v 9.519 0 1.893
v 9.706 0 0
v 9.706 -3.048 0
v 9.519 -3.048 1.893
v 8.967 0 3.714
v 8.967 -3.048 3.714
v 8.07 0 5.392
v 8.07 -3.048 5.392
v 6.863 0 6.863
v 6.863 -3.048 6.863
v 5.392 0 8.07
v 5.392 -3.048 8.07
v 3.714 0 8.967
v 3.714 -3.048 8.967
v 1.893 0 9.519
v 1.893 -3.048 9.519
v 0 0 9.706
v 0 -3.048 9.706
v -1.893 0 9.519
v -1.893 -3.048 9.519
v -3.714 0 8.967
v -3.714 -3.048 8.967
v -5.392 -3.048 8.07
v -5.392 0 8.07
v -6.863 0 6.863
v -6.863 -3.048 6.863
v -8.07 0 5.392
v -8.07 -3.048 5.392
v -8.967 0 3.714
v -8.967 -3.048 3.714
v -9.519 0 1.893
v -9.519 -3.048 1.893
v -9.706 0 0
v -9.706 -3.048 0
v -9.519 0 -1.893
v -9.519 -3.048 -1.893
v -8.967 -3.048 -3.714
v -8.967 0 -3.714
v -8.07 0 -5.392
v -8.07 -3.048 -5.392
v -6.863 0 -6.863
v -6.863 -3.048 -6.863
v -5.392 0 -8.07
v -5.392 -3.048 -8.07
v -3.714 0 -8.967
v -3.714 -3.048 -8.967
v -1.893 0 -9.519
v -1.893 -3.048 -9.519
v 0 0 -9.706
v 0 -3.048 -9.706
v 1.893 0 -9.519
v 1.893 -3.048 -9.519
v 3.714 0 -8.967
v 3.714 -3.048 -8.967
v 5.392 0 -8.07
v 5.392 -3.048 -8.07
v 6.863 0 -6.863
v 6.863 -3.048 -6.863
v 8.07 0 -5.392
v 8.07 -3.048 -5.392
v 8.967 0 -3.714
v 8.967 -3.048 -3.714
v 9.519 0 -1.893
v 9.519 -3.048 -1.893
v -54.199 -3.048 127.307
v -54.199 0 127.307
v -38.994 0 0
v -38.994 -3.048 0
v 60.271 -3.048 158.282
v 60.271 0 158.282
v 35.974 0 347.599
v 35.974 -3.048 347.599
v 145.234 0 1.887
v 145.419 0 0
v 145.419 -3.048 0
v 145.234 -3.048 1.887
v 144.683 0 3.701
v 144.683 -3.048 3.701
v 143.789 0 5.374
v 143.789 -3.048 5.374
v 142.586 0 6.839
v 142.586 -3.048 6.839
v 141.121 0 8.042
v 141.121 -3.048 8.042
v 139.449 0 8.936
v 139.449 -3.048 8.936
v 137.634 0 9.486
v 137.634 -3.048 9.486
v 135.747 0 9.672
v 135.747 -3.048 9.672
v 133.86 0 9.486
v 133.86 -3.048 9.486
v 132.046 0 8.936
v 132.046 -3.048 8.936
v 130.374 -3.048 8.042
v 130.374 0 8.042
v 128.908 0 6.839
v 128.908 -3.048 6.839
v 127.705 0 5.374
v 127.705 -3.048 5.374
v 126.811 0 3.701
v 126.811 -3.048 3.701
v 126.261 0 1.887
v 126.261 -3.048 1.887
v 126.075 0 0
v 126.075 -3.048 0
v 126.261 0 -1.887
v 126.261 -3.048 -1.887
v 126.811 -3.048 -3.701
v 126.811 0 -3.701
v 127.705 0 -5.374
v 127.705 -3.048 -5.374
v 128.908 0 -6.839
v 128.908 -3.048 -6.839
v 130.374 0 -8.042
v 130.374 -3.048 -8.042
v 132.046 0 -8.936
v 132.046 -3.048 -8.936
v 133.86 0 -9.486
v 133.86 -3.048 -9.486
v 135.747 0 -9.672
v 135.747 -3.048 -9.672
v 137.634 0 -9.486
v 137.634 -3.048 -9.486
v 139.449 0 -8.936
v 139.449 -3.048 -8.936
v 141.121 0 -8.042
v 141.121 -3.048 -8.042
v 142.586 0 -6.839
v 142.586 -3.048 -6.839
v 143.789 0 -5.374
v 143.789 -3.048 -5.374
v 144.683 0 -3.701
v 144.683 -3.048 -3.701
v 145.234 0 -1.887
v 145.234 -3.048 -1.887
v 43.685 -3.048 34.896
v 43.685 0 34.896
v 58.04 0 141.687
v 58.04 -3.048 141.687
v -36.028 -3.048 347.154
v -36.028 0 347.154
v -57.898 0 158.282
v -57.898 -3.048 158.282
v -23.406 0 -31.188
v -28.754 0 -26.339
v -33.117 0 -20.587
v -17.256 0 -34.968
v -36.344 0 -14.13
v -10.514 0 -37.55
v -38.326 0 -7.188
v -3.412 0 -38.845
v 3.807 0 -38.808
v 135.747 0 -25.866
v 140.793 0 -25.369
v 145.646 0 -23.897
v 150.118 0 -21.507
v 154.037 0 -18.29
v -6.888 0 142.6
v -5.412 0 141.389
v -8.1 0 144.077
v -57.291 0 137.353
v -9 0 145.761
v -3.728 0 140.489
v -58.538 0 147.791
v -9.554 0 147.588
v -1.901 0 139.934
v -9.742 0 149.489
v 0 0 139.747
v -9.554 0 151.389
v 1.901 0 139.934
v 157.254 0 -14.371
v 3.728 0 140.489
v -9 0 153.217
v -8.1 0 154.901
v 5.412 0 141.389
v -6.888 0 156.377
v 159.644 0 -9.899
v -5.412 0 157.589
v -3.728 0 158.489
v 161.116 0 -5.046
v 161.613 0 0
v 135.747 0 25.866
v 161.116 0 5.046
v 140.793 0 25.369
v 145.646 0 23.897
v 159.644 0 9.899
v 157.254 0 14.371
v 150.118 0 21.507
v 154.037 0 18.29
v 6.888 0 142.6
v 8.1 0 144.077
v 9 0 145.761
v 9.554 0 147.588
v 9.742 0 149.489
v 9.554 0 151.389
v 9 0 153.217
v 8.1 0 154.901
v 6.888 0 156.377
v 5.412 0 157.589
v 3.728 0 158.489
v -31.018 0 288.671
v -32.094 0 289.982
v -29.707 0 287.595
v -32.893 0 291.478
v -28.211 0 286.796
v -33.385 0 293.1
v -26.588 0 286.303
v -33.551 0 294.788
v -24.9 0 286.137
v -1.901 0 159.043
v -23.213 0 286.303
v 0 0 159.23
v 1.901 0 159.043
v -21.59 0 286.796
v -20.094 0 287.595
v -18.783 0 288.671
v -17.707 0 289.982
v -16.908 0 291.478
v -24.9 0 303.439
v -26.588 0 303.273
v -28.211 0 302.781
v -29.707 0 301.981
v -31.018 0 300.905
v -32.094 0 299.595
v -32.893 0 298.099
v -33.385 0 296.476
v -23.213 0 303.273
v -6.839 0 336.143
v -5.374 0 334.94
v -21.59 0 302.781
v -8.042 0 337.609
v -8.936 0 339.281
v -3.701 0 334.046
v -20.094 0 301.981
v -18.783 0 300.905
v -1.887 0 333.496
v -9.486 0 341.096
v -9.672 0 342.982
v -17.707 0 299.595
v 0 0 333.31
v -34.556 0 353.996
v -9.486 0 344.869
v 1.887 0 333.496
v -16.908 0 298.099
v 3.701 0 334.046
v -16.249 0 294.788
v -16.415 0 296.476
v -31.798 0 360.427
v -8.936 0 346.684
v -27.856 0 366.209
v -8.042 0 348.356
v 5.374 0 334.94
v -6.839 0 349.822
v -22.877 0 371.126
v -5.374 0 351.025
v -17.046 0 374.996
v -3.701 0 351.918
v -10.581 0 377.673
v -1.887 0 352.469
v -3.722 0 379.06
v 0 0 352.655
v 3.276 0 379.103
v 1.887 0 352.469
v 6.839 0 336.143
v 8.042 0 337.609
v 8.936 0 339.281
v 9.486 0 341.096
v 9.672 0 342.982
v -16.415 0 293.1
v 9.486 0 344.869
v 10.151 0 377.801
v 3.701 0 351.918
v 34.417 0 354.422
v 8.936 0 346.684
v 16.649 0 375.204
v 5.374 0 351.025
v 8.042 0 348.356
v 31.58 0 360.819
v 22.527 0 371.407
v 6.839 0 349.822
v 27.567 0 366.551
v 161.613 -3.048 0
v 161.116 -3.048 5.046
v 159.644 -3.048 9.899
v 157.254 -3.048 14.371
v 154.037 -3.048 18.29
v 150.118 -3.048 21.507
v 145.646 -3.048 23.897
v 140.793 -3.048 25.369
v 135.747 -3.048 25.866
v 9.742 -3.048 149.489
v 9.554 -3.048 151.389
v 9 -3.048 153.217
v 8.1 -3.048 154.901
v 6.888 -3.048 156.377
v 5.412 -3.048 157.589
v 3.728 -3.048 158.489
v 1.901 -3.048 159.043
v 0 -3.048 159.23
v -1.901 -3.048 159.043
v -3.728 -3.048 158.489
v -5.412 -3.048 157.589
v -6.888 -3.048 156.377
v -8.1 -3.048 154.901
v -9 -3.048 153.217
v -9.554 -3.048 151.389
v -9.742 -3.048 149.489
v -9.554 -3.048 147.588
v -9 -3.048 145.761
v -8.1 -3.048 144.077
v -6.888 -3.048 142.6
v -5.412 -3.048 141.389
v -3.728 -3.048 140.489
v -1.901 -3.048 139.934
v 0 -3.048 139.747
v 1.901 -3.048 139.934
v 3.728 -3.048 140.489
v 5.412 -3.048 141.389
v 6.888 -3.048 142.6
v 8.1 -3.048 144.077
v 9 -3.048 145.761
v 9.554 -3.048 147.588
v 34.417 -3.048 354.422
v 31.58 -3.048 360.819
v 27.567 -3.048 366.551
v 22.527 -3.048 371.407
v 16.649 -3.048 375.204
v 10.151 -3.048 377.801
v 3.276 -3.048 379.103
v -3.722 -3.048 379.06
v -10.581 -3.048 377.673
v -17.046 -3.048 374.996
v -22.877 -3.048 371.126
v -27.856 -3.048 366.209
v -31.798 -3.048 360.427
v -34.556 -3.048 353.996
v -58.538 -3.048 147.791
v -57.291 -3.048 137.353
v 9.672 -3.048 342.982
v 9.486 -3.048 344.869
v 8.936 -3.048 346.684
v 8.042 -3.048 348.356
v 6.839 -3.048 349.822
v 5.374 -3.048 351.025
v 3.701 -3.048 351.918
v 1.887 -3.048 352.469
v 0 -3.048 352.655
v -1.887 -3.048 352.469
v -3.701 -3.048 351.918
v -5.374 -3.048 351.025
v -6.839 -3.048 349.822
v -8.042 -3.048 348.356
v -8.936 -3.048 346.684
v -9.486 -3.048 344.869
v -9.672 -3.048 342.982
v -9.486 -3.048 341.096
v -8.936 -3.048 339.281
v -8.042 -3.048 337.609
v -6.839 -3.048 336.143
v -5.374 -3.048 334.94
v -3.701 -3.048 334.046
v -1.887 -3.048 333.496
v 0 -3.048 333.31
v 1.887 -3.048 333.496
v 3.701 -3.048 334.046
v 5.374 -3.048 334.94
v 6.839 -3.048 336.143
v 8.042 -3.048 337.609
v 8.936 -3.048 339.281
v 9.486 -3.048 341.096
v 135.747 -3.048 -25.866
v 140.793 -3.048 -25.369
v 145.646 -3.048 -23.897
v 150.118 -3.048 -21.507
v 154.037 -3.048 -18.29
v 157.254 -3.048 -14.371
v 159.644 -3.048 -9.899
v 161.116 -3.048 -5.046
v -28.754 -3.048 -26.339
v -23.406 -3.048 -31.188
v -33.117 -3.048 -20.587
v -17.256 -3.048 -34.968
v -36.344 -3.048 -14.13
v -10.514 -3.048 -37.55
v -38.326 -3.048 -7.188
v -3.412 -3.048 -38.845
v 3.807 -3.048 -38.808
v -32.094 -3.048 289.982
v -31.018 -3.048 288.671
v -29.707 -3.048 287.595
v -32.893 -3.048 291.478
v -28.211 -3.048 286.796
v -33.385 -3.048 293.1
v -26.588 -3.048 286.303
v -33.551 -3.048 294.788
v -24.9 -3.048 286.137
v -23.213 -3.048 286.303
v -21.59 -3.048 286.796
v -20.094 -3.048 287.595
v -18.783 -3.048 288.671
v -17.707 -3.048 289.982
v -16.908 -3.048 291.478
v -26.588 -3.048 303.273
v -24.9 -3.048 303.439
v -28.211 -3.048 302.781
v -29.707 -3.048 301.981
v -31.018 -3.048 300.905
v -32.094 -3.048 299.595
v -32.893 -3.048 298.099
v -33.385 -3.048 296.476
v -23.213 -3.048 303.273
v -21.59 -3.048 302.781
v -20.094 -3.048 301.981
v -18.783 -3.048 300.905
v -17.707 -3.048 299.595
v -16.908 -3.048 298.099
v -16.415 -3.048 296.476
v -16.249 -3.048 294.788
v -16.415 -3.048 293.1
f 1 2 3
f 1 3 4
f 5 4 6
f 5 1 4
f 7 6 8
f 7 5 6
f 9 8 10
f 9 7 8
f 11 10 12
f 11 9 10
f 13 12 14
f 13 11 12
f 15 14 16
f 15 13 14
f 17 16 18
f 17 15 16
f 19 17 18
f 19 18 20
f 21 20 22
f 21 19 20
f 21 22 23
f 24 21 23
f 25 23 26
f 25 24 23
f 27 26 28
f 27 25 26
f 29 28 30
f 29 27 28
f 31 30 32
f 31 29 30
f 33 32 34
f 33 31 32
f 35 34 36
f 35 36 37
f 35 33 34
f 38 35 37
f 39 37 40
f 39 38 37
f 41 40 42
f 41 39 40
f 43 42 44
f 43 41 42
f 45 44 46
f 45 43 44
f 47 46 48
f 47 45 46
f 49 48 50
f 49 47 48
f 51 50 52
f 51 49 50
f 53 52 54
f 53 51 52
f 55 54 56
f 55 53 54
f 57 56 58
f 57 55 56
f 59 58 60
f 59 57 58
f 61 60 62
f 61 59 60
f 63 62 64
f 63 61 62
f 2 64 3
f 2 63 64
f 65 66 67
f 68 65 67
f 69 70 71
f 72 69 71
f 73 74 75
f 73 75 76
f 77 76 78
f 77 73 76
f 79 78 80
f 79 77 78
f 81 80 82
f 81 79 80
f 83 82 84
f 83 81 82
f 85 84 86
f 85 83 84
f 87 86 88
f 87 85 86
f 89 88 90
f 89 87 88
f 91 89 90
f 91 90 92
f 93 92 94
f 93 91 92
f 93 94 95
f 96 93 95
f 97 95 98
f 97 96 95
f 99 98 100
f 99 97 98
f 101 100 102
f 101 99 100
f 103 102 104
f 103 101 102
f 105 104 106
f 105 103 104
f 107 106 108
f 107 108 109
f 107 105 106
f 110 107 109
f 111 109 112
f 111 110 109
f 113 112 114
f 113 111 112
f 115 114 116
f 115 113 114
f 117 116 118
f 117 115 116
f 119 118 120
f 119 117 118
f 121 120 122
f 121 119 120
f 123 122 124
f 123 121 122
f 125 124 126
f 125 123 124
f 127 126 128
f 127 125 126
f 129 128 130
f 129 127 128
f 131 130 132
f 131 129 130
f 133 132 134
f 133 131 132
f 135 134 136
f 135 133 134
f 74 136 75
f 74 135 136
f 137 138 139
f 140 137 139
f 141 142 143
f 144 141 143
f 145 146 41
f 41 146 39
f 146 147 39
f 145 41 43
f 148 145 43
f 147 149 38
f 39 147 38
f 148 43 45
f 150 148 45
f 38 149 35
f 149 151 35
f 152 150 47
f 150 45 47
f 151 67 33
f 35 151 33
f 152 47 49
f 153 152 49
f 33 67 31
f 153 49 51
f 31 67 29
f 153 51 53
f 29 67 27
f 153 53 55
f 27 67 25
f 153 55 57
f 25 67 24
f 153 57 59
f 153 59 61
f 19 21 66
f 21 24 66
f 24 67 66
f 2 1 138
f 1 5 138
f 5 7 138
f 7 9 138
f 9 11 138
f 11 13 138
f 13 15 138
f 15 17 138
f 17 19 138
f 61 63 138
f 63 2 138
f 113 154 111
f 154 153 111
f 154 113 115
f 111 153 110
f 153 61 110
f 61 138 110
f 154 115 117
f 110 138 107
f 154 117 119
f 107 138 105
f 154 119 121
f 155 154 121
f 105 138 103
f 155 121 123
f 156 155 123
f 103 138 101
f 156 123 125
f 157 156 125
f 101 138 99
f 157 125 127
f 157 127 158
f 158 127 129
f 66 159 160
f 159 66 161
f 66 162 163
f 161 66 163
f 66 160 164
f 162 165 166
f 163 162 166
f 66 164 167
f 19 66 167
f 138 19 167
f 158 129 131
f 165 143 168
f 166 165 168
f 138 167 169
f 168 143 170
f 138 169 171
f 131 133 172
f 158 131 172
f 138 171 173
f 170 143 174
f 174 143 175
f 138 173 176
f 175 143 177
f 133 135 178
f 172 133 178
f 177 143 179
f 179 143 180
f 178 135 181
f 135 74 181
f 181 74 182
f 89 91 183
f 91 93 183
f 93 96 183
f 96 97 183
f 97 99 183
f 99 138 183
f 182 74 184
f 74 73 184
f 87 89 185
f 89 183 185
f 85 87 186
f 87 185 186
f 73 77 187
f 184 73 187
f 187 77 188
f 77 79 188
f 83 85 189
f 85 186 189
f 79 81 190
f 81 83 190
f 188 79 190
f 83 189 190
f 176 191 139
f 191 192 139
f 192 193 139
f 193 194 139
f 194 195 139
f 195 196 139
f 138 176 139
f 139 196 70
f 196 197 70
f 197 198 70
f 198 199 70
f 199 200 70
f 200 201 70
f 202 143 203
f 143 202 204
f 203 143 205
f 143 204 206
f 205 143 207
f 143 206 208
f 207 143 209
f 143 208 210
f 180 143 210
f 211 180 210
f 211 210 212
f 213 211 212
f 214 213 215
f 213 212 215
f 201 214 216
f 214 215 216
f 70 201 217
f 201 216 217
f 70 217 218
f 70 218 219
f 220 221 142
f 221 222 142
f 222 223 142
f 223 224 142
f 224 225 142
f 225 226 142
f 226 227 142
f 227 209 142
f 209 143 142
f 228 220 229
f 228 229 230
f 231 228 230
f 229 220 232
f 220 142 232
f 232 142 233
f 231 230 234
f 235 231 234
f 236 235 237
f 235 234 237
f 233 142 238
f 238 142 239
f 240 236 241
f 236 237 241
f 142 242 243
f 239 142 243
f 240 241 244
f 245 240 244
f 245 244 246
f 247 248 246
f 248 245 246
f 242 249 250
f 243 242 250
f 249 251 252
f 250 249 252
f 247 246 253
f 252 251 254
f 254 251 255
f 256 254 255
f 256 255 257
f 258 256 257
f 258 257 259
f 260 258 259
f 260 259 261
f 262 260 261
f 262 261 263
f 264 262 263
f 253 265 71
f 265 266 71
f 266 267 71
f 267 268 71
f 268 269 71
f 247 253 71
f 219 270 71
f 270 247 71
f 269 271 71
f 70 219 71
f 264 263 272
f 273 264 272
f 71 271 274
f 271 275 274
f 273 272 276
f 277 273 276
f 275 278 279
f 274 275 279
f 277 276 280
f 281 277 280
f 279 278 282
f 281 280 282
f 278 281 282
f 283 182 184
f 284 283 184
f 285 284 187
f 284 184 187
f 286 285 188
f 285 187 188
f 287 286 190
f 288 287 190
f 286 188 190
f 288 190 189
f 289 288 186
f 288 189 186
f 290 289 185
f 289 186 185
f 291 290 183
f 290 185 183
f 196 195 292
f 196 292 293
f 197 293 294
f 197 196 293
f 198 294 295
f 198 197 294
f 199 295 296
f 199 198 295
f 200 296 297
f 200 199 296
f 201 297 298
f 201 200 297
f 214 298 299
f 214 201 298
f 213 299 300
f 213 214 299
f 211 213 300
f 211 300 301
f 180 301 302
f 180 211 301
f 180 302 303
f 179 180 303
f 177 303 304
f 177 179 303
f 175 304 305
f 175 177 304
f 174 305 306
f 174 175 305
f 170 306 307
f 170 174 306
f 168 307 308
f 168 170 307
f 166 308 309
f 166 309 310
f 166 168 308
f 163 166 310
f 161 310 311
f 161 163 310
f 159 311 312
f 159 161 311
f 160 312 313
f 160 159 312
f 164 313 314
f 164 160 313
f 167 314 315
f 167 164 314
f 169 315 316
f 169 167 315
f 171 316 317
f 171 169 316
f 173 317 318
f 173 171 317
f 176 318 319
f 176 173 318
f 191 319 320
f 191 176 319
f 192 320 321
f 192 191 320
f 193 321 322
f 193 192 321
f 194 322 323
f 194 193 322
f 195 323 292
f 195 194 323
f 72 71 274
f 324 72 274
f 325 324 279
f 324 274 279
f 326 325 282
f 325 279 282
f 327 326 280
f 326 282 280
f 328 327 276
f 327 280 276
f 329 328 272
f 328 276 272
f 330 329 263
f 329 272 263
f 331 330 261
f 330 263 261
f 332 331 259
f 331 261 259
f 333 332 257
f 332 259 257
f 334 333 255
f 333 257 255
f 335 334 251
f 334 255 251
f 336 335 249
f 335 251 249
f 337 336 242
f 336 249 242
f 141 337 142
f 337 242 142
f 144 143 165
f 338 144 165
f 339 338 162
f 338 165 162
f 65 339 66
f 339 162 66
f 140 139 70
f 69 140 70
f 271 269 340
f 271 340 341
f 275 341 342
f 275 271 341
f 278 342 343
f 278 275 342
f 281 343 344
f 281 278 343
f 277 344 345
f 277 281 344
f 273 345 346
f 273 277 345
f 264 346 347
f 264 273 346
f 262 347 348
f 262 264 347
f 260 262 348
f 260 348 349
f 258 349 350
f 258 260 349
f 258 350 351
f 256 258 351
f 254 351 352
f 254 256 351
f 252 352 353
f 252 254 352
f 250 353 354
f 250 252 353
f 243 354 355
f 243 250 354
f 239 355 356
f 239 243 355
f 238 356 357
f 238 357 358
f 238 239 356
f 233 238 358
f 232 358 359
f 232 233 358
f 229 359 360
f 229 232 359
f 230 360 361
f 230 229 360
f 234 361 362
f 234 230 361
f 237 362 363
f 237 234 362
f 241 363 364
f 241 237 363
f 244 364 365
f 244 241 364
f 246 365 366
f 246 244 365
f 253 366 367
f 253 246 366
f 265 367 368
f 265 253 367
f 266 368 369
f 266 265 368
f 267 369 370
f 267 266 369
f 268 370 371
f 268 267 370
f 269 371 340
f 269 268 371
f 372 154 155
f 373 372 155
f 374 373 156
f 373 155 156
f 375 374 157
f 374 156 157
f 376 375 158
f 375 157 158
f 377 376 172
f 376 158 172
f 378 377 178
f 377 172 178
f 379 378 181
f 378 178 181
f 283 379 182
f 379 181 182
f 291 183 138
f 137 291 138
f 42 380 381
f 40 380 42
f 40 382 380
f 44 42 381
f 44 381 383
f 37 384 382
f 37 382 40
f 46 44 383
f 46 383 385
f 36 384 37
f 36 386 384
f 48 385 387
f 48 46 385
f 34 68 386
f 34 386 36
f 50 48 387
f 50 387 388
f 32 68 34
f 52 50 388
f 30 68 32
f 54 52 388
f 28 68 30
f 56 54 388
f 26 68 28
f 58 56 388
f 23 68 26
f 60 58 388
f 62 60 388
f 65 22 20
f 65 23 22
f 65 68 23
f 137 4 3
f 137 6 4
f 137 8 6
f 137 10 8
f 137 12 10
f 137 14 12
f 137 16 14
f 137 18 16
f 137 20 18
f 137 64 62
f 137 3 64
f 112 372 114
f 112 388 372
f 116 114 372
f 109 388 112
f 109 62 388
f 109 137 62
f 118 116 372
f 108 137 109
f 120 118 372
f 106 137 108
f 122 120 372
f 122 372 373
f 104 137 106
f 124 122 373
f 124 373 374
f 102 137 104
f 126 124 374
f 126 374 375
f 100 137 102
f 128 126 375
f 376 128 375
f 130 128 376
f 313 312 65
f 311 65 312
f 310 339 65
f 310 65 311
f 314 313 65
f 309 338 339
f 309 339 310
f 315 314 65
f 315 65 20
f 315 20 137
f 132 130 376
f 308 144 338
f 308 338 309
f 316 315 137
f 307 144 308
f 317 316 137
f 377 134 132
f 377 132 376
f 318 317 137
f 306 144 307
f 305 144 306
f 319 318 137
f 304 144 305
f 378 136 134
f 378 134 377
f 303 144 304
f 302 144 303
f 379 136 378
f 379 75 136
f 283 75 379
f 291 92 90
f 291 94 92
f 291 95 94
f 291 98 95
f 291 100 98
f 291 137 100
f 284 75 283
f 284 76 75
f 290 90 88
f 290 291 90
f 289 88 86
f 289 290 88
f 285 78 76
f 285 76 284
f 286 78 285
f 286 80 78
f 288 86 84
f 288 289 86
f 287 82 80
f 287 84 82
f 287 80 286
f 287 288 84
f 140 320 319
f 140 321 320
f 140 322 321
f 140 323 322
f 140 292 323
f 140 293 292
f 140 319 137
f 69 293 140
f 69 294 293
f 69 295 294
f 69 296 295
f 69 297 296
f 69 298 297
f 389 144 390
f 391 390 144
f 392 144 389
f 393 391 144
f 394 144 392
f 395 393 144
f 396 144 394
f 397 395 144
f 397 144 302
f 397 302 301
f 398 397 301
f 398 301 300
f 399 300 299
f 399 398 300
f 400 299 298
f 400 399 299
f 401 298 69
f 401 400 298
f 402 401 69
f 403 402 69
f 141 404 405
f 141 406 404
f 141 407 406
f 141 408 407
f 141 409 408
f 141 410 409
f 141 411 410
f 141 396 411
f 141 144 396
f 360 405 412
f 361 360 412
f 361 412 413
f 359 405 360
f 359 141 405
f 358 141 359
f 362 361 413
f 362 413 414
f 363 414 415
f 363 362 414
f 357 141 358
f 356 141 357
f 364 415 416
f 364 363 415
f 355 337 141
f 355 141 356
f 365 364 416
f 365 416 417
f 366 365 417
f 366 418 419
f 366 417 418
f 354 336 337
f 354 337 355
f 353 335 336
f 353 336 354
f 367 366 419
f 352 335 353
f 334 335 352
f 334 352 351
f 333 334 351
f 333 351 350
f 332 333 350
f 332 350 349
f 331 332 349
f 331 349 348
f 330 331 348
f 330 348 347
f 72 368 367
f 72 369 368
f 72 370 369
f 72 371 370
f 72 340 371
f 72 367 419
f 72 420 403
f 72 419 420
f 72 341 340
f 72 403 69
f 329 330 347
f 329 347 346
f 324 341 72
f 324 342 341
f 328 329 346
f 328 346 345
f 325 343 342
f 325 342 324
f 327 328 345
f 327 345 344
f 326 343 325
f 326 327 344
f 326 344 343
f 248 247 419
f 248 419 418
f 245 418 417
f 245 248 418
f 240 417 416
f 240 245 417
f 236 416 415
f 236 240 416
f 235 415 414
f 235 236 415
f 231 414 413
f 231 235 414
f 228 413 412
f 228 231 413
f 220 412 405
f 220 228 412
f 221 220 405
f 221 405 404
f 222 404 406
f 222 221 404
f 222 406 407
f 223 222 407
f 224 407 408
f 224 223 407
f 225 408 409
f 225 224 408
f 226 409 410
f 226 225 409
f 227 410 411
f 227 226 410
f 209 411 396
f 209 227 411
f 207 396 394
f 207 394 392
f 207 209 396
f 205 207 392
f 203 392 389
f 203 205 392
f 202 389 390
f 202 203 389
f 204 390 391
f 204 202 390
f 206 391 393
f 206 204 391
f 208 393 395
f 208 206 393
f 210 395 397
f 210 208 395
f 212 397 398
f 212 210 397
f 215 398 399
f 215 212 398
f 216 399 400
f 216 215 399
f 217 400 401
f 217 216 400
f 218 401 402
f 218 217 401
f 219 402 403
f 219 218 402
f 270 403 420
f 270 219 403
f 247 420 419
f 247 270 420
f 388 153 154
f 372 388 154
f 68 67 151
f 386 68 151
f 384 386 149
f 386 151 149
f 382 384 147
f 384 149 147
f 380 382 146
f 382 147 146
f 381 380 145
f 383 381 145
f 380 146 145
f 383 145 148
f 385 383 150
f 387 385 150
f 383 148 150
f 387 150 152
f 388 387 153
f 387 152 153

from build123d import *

# Parameters (mm, degrees)
F0_R     = 9.7055451223
F0_R_2   = 9.741664506
F0_R_3   = 9.6722617748
F0_R_4   = 8.6511366969
F0_R_5   = 9.6722557952
F1_DEPTH = 3.048


with BuildPart() as f1:
    # F0 (on Front) → F1 (new body)
    with BuildSketch(Plane.XZ):
        with BuildLine():
            ThreePointArc((3.8066026136, 38.808027463), (-26.1927234435, 28.8876177218), (-38.9942716181, 0))
            ThreePointArc((-38.9942716181, 0), (-26.1927225437, -28.8876185377), (3.8066050311, -38.8080272259))
            ThreePointArc((3.8066050311, -38.8080272259), (28.8876185377, -26.1927225437), (38.9942716181, 0))
            ThreePointArc((38.9942716181, 0), (28.8876177218, 26.1927234435), (3.8066026136, 38.808027463))
        make_face()
        Circle(F0_R, mode=Mode.SUBTRACT)
        with BuildLine():
            Line((-54.198741575, 127.3070507144), (-38.9942716181, 0))
            ThreePointArc((-38.9942716181, 0), (-26.1927234435, 28.8876177218), (3.8066026136, 38.808027463))
            Line((3.8066026136, 38.808027463), (43.6851335777, 34.8964187714))
            Line((43.6851335777, 34.8964187714), (58.0401596038, 141.6868133715))
            ThreePointArc((58.0401596038, 141.6868133715), (7.4420102551, 91.4013122397), (-54.198741575, 127.3070507144))
        make_face()
        with BuildLine():
            ThreePointArc((38.9942716181, 0), (28.8876185377, -26.1927225437), (3.8066050311, -38.8080272259))
            Line((3.8066050311, -38.8080272259), (135.7471495867, -25.8662320197))
            ThreePointArc((135.7471495867, -25.8662320197), (109.880917567, 0), (135.7471495867, 25.8662320197))
            Line((135.7471495867, 25.8662320197), (43.6851335777, 34.8964187714))
            Line((43.6851335777, 34.8964187714), (38.9942716181, 0))
        make_face()
        with BuildLine():
            Line((43.6851335777, 34.8964187714), (3.8066026136, 38.808027463))
            ThreePointArc((3.8066026136, 38.808027463), (28.8876177218, 26.1927234435), (38.9942716181, 0))
            Line((38.9942716181, 0), (43.6851335777, 34.8964187714))
        make_face()
        with BuildLine():
            Line((-57.8981825428, 158.2824757208), (-54.198741575, 127.3070507144))
            ThreePointArc((-54.198741575, 127.3070507144), (7.4420102551, 91.4013122397), (58.0401596038, 141.6868133715))
            ThreePointArc((58.0401596038, 141.6868133715), (58.4315346455, 145.5790412778), (58.5621873175, 149.4887142024))
            ThreePointArc((58.5621873175, 149.4887142024), (4.409397464, 207.8846643822), (-57.8981825428, 158.2824757208))
        make_face()
        with Locations((0, 149.4887142024)):
            Circle(F0_R_2, mode=Mode.SUBTRACT)
        with BuildLine():
            ThreePointArc((-57.8981825428, 158.2824757208), (-58.1489409856, 142.5438999028), (-54.198741575, 127.3070507144))
            Line((-54.198741575, 127.3070507144), (-57.8981825428, 158.2824757208))
        make_face()
        with BuildLine():
            ThreePointArc((135.7471495867, 25.8662320197), (109.880917567, 0), (135.7471495867, -25.8662320197))
            ThreePointArc((135.7471495867, -25.8662320197), (154.0373376515, -18.2901880649), (161.6133816064, 0))
            ThreePointArc((161.6133816064, 0), (154.0373376515, 18.2901880649), (135.7471495867, 25.8662320197))
        make_face()
        with Locations((135.7471495867, 0)):
            Circle(F0_R_3, mode=Mode.SUBTRACT)
        with BuildLine():
            Line((-36.0279004475, 347.1542968414), (-57.8981825428, 158.2824757208))
            ThreePointArc((-57.8981825428, 158.2824757208), (4.409397464, 207.8846643822), (58.5621873175, 149.4887142024))
            ThreePointArc((58.5621873175, 149.4887142024), (58.4315346455, 145.5790412778), (58.0401596038, 141.6868133715))
            Line((58.0401596038, 141.6868133715), (60.2709891258, 158.2824757208))
            Line((60.2709891258, 158.2824757208), (35.9735681678, 347.599410979))
            ThreePointArc((35.9735681678, 347.599410979), (36.1947916427, 345.2956505186), (36.2686330263, 342.9824709892))
            ThreePointArc((36.2686330263, 342.9824709892), (-2.0893828703, 306.7740711238), (-36.0279004475, 347.1542968414))
        make_face()
        with Locations((-24.9003618956, 294.7882115841)):
            Circle(F0_R_4, mode=Mode.SUBTRACT)
        with BuildLine():
            ThreePointArc((35.9735681678, 347.599410979), (-0.2242089383, 379.2504109906), (-36.0279004475, 347.1542968414))
            ThreePointArc((-36.0279004475, 347.1542968414), (-2.0893828703, 306.7740711238), (36.2686330263, 342.9824709892))
            ThreePointArc((36.2686330263, 342.9824709892), (36.1947916427, 345.2956505186), (35.9735681678, 347.599410979))
        make_face()
        with Locations((0, 342.9824709892)):
            Circle(F0_R_5, mode=Mode.SUBTRACT)
    extrude(amount=F1_DEPTH)


solid = f1.part
